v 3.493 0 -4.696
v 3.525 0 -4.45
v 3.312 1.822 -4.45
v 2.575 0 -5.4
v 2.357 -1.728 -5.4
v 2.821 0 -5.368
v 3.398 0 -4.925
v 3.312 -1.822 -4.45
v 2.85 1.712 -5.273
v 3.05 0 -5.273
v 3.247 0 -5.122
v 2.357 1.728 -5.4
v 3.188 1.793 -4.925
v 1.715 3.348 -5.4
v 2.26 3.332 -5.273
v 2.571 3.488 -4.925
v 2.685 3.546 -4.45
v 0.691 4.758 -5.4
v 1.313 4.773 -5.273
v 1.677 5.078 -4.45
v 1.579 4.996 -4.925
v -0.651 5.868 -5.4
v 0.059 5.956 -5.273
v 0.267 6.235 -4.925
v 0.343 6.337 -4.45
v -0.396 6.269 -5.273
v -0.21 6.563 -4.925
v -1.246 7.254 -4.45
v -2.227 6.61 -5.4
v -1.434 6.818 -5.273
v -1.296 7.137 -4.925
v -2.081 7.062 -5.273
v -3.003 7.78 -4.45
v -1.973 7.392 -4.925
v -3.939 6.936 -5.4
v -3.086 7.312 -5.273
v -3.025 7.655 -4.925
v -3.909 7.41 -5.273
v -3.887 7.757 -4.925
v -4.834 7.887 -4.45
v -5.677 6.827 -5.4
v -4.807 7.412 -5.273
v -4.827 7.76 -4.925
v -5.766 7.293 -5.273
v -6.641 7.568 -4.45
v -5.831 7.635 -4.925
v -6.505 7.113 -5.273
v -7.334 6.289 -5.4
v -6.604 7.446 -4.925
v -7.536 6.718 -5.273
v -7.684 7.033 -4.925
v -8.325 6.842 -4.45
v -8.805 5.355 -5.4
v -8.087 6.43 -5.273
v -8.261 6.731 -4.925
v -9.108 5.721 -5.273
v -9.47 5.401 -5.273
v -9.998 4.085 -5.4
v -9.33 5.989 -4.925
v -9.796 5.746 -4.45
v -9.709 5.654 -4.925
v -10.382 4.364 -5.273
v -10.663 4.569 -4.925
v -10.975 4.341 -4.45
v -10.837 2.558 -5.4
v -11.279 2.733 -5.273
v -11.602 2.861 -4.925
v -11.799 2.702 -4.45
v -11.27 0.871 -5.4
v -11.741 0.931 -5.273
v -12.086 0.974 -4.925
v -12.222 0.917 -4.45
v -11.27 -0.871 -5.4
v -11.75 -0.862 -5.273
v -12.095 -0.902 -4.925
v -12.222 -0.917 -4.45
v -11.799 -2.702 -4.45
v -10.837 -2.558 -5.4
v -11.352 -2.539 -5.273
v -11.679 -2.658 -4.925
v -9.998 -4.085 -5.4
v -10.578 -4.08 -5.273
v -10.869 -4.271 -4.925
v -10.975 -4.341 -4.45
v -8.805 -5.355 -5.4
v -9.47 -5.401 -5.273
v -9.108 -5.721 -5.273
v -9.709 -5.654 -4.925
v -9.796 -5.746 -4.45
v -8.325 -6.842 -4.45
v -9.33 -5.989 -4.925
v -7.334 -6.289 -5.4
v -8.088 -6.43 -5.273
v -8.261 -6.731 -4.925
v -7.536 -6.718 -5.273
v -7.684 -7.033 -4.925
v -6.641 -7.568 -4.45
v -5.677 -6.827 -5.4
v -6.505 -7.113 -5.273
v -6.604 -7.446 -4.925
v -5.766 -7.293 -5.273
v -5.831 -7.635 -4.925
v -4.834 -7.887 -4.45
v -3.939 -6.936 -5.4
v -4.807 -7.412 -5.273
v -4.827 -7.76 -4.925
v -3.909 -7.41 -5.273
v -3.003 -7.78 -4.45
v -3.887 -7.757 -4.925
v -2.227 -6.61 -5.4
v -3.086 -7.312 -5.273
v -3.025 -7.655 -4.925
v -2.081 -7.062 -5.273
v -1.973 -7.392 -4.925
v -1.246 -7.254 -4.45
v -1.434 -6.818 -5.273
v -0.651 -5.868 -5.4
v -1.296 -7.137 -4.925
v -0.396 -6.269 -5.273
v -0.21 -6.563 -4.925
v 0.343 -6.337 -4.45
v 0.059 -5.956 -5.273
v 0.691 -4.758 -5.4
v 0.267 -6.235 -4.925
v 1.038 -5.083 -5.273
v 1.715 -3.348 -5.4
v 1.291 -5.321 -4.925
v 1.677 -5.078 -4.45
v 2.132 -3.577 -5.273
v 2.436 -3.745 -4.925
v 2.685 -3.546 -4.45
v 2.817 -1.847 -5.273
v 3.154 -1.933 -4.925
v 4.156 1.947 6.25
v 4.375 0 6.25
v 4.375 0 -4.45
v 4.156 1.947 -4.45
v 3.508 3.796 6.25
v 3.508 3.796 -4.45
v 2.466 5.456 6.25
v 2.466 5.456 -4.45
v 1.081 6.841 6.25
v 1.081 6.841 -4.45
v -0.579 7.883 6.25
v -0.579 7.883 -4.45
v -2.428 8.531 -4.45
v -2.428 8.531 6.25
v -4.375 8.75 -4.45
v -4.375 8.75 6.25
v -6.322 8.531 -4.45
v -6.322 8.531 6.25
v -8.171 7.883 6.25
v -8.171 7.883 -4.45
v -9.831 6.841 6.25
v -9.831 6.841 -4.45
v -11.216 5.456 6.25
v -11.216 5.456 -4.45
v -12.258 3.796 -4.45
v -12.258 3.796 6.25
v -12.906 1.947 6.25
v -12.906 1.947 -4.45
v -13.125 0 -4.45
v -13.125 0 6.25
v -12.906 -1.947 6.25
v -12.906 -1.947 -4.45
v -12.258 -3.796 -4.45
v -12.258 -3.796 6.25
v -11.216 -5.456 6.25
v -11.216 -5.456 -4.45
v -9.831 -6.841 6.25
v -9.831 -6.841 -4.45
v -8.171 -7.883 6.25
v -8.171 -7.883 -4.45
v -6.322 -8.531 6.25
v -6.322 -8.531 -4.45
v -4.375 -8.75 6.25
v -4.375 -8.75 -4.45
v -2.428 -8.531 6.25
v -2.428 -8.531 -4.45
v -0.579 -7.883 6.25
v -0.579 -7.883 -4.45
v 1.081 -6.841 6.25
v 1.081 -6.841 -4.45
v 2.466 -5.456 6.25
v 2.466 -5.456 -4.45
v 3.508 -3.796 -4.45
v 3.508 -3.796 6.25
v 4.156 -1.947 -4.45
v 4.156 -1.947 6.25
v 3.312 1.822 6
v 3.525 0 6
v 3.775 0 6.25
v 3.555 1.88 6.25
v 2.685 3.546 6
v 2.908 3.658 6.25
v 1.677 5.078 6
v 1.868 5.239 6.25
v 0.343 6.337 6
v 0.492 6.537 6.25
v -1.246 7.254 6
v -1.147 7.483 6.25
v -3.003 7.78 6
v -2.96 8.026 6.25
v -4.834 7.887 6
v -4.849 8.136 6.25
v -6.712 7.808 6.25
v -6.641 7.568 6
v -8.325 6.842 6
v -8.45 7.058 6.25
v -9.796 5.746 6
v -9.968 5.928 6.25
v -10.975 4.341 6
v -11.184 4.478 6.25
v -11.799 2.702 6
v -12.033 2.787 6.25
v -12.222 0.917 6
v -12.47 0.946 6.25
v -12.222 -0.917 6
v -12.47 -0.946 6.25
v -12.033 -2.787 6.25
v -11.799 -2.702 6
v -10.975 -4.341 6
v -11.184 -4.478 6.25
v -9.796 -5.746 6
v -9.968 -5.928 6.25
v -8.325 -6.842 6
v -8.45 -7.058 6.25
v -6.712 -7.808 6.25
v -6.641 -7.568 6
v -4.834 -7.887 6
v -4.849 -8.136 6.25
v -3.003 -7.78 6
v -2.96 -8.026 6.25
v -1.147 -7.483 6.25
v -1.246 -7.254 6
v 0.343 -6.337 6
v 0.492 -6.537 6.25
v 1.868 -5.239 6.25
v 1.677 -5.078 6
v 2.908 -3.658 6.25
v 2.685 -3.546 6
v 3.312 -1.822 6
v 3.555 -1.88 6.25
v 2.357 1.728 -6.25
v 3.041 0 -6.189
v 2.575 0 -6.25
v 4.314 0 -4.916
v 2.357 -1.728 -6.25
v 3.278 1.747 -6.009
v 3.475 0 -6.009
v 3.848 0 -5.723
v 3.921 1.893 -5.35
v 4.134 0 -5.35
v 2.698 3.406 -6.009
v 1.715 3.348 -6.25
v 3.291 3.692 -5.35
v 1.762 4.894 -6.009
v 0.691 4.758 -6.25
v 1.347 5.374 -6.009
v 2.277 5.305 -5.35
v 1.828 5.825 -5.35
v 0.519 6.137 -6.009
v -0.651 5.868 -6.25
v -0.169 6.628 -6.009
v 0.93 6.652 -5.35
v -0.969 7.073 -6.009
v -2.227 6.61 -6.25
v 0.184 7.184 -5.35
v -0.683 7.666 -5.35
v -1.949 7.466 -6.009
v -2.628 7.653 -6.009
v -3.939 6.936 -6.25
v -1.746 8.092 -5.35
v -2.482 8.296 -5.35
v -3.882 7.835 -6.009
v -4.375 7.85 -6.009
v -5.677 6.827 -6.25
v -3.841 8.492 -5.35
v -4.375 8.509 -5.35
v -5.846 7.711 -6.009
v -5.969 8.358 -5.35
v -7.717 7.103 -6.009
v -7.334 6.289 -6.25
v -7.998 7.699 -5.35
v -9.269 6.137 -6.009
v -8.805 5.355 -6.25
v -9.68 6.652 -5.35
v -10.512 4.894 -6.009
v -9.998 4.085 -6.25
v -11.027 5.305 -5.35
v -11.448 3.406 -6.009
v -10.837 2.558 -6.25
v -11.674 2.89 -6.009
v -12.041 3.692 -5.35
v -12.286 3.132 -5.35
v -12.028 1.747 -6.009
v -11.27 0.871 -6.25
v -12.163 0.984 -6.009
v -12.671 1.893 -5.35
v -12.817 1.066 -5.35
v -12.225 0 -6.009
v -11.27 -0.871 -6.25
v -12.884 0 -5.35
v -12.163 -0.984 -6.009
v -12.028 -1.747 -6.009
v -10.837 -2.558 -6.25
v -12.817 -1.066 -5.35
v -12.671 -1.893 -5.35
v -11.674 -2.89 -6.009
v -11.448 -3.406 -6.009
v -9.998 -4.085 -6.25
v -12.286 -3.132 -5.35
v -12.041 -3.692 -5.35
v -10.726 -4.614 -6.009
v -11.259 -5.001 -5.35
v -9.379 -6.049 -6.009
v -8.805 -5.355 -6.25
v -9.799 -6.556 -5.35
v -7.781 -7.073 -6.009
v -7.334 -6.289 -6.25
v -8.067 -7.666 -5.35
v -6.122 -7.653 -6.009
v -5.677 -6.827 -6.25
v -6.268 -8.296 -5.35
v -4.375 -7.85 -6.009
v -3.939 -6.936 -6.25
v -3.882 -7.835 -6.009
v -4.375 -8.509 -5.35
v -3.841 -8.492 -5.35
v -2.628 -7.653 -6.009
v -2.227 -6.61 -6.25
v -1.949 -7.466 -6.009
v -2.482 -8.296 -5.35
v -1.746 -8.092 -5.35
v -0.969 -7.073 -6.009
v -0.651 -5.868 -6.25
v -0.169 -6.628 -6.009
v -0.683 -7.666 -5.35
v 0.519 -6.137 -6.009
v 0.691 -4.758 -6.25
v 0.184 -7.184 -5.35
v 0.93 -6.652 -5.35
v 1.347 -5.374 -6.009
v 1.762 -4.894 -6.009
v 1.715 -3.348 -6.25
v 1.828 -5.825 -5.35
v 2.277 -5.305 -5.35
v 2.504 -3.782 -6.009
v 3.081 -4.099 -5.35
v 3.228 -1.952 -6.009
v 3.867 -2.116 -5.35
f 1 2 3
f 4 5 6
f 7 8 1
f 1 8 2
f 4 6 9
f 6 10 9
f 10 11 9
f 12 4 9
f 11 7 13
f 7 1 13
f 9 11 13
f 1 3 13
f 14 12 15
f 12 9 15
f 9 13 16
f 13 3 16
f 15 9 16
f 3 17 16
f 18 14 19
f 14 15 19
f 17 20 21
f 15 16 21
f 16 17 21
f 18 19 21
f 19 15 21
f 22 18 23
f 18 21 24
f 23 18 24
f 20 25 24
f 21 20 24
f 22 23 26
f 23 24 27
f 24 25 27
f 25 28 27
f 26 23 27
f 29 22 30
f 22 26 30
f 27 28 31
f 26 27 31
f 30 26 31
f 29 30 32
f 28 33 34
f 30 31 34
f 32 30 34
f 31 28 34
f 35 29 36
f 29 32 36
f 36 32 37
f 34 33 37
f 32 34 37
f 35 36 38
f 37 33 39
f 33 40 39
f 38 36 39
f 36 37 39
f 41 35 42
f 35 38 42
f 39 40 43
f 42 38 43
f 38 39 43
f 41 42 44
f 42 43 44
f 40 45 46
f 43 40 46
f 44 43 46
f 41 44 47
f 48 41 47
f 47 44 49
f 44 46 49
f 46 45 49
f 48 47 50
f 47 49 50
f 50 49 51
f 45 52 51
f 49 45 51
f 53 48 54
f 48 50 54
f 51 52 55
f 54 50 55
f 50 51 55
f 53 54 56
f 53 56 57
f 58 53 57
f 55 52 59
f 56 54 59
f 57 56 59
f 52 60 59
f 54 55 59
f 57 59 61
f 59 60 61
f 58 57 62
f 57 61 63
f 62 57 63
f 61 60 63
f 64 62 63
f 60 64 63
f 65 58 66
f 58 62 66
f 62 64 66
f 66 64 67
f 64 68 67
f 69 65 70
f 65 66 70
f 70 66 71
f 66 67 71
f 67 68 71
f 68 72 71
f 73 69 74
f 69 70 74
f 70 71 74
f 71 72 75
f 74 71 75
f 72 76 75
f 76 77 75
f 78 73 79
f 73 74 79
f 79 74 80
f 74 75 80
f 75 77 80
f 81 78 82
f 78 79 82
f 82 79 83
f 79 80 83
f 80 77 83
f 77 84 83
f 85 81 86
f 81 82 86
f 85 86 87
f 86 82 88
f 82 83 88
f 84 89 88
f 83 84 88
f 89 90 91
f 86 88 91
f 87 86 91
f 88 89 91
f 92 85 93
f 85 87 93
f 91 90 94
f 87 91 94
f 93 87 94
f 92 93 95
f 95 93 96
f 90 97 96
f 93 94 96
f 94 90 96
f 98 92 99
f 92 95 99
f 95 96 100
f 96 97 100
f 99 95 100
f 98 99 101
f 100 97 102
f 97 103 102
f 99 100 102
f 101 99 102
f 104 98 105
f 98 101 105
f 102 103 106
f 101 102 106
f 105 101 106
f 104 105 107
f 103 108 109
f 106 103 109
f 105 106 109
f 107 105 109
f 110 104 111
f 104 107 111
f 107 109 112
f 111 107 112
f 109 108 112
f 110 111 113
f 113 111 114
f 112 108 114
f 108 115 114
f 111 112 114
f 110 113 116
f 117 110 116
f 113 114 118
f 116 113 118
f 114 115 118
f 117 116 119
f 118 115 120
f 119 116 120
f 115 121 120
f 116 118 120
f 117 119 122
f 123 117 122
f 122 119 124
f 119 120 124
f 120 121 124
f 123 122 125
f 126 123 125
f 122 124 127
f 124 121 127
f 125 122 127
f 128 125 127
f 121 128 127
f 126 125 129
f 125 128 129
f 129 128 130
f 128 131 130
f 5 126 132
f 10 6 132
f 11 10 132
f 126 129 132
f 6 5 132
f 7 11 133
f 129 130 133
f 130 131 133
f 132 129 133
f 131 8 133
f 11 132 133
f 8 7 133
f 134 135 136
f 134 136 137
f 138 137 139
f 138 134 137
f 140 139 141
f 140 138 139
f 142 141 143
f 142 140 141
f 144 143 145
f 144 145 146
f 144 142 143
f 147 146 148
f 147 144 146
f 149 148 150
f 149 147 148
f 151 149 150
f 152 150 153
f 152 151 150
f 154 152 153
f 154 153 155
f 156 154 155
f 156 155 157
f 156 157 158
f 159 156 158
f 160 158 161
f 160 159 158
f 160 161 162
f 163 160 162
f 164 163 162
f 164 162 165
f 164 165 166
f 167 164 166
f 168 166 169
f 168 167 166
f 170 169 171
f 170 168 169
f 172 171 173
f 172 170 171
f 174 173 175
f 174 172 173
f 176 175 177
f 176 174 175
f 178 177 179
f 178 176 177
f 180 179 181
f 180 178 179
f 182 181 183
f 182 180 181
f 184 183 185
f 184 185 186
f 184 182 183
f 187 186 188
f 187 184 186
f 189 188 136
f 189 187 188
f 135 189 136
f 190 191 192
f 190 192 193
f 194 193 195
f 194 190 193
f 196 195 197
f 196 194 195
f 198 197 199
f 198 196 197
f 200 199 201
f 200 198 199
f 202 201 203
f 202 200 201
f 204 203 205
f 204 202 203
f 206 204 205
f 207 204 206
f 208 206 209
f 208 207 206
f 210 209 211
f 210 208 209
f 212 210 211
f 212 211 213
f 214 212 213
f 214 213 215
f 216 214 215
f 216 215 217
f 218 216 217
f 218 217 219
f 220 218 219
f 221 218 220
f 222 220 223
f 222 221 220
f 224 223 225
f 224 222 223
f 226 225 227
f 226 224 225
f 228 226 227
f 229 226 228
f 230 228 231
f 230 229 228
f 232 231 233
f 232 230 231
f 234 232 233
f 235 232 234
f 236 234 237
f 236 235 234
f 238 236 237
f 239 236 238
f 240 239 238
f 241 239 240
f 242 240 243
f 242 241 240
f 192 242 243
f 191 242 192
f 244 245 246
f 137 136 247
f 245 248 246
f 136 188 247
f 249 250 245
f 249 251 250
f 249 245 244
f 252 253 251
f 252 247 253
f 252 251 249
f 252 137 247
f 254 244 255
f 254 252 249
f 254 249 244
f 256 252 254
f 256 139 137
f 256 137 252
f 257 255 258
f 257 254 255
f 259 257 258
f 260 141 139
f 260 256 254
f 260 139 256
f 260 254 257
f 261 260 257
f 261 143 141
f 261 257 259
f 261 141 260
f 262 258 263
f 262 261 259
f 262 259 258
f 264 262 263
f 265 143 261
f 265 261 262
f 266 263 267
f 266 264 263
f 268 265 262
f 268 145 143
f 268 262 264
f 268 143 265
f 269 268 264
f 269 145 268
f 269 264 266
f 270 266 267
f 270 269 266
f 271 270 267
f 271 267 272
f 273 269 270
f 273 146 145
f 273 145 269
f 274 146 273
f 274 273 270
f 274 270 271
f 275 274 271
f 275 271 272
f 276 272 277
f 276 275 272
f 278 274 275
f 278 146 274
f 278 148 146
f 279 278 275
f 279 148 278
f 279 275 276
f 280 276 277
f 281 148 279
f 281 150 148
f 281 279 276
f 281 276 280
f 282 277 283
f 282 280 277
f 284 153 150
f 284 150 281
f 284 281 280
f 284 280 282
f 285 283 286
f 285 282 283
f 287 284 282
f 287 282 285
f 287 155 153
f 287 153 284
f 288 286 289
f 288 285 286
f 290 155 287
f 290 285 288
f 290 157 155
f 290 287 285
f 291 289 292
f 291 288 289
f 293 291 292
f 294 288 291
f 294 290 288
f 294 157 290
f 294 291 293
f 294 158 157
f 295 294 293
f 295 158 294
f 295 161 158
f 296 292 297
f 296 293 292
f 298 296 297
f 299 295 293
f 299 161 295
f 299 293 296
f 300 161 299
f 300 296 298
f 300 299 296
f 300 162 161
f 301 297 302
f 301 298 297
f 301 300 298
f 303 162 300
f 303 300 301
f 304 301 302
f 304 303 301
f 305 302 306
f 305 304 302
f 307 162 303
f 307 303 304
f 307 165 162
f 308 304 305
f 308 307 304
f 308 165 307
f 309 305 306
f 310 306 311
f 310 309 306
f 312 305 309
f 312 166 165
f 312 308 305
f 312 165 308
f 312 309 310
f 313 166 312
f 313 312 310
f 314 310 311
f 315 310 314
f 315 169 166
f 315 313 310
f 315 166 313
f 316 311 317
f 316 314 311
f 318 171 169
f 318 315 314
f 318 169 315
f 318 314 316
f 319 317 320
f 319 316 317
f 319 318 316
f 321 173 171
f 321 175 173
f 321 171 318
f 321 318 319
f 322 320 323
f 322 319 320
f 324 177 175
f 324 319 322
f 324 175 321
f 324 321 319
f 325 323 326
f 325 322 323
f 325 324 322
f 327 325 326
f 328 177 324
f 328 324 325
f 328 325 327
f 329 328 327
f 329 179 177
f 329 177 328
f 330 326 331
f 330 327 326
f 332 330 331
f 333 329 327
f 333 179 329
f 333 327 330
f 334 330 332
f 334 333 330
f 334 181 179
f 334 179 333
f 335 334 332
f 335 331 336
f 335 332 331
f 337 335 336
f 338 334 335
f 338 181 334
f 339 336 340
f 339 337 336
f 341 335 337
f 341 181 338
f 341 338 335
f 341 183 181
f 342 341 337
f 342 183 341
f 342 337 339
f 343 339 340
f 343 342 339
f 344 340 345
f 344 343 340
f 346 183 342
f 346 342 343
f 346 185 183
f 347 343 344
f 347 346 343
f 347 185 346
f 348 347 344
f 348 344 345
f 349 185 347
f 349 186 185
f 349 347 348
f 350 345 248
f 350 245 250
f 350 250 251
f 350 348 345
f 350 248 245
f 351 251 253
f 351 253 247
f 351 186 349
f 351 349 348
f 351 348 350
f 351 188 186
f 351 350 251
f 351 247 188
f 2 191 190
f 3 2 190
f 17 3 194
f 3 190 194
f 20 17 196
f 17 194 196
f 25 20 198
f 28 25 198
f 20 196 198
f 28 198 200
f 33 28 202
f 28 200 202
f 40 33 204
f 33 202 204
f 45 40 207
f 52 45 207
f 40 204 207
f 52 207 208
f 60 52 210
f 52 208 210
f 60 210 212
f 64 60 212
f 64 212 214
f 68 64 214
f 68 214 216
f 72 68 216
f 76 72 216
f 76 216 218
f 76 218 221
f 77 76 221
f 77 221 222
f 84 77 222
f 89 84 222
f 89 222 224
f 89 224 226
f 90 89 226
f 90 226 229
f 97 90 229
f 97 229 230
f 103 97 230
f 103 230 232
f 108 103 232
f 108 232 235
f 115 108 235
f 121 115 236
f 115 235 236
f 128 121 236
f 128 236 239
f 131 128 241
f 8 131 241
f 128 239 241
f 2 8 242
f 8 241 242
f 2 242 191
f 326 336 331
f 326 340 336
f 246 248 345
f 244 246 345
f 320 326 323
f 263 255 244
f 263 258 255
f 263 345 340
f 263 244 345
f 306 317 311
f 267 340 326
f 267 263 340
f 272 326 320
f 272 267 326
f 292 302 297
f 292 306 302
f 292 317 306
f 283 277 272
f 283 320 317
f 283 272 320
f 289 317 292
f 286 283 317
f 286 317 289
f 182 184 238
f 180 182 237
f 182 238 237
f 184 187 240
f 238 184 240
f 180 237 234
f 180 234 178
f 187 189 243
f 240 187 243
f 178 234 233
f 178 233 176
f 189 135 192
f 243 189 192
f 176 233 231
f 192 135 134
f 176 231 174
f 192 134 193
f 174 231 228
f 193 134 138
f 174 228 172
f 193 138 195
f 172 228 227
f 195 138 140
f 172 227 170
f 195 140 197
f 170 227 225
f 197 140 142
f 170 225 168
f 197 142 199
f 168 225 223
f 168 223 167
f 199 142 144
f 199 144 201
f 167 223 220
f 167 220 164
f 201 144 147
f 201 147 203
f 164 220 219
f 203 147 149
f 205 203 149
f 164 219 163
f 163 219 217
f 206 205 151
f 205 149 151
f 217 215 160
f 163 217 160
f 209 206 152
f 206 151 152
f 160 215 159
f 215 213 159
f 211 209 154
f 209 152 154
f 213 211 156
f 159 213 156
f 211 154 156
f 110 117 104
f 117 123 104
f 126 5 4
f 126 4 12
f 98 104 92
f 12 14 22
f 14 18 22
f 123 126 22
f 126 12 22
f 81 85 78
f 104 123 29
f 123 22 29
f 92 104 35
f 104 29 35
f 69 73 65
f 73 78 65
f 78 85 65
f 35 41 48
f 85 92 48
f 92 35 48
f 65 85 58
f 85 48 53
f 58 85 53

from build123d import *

# Parameters (mm, degrees)
F0_W    = 8.75
F0_H    = 12.5
F2_R    = 1.8
F3_T    = -0.85
F4_SIZE = 0.25


with BuildPart() as f1:
    # F0 (on Front) → F1 (revolve)
    with BuildSketch(Plane.XZ):
        Rectangle(F0_W, F0_H)
    revolve(axis=Axis((-4.375, 0, 0), (0, 0, 1)))

    # F2
    f2_edges = [f1.edges().sort_by_distance(p)[0] for p in [
        (-13.125, 0, -6.25),
    ]]
    fillet(f2_edges, radius=F2_R)

    # F3
    f3_openings = [f1.faces().sort_by_distance(p)[0] for p in [
        (-4.375, 0, 6.25),
    ]]
    offset(amount=F3_T, openings=f3_openings)

    # F4
    f4_edges = [f1.edges().sort_by_distance(p)[0] for p in [
        (-12.275, 0, 6.25),
    ]]
    chamfer(f4_edges, length=F4_SIZE)


solid = f1.part
